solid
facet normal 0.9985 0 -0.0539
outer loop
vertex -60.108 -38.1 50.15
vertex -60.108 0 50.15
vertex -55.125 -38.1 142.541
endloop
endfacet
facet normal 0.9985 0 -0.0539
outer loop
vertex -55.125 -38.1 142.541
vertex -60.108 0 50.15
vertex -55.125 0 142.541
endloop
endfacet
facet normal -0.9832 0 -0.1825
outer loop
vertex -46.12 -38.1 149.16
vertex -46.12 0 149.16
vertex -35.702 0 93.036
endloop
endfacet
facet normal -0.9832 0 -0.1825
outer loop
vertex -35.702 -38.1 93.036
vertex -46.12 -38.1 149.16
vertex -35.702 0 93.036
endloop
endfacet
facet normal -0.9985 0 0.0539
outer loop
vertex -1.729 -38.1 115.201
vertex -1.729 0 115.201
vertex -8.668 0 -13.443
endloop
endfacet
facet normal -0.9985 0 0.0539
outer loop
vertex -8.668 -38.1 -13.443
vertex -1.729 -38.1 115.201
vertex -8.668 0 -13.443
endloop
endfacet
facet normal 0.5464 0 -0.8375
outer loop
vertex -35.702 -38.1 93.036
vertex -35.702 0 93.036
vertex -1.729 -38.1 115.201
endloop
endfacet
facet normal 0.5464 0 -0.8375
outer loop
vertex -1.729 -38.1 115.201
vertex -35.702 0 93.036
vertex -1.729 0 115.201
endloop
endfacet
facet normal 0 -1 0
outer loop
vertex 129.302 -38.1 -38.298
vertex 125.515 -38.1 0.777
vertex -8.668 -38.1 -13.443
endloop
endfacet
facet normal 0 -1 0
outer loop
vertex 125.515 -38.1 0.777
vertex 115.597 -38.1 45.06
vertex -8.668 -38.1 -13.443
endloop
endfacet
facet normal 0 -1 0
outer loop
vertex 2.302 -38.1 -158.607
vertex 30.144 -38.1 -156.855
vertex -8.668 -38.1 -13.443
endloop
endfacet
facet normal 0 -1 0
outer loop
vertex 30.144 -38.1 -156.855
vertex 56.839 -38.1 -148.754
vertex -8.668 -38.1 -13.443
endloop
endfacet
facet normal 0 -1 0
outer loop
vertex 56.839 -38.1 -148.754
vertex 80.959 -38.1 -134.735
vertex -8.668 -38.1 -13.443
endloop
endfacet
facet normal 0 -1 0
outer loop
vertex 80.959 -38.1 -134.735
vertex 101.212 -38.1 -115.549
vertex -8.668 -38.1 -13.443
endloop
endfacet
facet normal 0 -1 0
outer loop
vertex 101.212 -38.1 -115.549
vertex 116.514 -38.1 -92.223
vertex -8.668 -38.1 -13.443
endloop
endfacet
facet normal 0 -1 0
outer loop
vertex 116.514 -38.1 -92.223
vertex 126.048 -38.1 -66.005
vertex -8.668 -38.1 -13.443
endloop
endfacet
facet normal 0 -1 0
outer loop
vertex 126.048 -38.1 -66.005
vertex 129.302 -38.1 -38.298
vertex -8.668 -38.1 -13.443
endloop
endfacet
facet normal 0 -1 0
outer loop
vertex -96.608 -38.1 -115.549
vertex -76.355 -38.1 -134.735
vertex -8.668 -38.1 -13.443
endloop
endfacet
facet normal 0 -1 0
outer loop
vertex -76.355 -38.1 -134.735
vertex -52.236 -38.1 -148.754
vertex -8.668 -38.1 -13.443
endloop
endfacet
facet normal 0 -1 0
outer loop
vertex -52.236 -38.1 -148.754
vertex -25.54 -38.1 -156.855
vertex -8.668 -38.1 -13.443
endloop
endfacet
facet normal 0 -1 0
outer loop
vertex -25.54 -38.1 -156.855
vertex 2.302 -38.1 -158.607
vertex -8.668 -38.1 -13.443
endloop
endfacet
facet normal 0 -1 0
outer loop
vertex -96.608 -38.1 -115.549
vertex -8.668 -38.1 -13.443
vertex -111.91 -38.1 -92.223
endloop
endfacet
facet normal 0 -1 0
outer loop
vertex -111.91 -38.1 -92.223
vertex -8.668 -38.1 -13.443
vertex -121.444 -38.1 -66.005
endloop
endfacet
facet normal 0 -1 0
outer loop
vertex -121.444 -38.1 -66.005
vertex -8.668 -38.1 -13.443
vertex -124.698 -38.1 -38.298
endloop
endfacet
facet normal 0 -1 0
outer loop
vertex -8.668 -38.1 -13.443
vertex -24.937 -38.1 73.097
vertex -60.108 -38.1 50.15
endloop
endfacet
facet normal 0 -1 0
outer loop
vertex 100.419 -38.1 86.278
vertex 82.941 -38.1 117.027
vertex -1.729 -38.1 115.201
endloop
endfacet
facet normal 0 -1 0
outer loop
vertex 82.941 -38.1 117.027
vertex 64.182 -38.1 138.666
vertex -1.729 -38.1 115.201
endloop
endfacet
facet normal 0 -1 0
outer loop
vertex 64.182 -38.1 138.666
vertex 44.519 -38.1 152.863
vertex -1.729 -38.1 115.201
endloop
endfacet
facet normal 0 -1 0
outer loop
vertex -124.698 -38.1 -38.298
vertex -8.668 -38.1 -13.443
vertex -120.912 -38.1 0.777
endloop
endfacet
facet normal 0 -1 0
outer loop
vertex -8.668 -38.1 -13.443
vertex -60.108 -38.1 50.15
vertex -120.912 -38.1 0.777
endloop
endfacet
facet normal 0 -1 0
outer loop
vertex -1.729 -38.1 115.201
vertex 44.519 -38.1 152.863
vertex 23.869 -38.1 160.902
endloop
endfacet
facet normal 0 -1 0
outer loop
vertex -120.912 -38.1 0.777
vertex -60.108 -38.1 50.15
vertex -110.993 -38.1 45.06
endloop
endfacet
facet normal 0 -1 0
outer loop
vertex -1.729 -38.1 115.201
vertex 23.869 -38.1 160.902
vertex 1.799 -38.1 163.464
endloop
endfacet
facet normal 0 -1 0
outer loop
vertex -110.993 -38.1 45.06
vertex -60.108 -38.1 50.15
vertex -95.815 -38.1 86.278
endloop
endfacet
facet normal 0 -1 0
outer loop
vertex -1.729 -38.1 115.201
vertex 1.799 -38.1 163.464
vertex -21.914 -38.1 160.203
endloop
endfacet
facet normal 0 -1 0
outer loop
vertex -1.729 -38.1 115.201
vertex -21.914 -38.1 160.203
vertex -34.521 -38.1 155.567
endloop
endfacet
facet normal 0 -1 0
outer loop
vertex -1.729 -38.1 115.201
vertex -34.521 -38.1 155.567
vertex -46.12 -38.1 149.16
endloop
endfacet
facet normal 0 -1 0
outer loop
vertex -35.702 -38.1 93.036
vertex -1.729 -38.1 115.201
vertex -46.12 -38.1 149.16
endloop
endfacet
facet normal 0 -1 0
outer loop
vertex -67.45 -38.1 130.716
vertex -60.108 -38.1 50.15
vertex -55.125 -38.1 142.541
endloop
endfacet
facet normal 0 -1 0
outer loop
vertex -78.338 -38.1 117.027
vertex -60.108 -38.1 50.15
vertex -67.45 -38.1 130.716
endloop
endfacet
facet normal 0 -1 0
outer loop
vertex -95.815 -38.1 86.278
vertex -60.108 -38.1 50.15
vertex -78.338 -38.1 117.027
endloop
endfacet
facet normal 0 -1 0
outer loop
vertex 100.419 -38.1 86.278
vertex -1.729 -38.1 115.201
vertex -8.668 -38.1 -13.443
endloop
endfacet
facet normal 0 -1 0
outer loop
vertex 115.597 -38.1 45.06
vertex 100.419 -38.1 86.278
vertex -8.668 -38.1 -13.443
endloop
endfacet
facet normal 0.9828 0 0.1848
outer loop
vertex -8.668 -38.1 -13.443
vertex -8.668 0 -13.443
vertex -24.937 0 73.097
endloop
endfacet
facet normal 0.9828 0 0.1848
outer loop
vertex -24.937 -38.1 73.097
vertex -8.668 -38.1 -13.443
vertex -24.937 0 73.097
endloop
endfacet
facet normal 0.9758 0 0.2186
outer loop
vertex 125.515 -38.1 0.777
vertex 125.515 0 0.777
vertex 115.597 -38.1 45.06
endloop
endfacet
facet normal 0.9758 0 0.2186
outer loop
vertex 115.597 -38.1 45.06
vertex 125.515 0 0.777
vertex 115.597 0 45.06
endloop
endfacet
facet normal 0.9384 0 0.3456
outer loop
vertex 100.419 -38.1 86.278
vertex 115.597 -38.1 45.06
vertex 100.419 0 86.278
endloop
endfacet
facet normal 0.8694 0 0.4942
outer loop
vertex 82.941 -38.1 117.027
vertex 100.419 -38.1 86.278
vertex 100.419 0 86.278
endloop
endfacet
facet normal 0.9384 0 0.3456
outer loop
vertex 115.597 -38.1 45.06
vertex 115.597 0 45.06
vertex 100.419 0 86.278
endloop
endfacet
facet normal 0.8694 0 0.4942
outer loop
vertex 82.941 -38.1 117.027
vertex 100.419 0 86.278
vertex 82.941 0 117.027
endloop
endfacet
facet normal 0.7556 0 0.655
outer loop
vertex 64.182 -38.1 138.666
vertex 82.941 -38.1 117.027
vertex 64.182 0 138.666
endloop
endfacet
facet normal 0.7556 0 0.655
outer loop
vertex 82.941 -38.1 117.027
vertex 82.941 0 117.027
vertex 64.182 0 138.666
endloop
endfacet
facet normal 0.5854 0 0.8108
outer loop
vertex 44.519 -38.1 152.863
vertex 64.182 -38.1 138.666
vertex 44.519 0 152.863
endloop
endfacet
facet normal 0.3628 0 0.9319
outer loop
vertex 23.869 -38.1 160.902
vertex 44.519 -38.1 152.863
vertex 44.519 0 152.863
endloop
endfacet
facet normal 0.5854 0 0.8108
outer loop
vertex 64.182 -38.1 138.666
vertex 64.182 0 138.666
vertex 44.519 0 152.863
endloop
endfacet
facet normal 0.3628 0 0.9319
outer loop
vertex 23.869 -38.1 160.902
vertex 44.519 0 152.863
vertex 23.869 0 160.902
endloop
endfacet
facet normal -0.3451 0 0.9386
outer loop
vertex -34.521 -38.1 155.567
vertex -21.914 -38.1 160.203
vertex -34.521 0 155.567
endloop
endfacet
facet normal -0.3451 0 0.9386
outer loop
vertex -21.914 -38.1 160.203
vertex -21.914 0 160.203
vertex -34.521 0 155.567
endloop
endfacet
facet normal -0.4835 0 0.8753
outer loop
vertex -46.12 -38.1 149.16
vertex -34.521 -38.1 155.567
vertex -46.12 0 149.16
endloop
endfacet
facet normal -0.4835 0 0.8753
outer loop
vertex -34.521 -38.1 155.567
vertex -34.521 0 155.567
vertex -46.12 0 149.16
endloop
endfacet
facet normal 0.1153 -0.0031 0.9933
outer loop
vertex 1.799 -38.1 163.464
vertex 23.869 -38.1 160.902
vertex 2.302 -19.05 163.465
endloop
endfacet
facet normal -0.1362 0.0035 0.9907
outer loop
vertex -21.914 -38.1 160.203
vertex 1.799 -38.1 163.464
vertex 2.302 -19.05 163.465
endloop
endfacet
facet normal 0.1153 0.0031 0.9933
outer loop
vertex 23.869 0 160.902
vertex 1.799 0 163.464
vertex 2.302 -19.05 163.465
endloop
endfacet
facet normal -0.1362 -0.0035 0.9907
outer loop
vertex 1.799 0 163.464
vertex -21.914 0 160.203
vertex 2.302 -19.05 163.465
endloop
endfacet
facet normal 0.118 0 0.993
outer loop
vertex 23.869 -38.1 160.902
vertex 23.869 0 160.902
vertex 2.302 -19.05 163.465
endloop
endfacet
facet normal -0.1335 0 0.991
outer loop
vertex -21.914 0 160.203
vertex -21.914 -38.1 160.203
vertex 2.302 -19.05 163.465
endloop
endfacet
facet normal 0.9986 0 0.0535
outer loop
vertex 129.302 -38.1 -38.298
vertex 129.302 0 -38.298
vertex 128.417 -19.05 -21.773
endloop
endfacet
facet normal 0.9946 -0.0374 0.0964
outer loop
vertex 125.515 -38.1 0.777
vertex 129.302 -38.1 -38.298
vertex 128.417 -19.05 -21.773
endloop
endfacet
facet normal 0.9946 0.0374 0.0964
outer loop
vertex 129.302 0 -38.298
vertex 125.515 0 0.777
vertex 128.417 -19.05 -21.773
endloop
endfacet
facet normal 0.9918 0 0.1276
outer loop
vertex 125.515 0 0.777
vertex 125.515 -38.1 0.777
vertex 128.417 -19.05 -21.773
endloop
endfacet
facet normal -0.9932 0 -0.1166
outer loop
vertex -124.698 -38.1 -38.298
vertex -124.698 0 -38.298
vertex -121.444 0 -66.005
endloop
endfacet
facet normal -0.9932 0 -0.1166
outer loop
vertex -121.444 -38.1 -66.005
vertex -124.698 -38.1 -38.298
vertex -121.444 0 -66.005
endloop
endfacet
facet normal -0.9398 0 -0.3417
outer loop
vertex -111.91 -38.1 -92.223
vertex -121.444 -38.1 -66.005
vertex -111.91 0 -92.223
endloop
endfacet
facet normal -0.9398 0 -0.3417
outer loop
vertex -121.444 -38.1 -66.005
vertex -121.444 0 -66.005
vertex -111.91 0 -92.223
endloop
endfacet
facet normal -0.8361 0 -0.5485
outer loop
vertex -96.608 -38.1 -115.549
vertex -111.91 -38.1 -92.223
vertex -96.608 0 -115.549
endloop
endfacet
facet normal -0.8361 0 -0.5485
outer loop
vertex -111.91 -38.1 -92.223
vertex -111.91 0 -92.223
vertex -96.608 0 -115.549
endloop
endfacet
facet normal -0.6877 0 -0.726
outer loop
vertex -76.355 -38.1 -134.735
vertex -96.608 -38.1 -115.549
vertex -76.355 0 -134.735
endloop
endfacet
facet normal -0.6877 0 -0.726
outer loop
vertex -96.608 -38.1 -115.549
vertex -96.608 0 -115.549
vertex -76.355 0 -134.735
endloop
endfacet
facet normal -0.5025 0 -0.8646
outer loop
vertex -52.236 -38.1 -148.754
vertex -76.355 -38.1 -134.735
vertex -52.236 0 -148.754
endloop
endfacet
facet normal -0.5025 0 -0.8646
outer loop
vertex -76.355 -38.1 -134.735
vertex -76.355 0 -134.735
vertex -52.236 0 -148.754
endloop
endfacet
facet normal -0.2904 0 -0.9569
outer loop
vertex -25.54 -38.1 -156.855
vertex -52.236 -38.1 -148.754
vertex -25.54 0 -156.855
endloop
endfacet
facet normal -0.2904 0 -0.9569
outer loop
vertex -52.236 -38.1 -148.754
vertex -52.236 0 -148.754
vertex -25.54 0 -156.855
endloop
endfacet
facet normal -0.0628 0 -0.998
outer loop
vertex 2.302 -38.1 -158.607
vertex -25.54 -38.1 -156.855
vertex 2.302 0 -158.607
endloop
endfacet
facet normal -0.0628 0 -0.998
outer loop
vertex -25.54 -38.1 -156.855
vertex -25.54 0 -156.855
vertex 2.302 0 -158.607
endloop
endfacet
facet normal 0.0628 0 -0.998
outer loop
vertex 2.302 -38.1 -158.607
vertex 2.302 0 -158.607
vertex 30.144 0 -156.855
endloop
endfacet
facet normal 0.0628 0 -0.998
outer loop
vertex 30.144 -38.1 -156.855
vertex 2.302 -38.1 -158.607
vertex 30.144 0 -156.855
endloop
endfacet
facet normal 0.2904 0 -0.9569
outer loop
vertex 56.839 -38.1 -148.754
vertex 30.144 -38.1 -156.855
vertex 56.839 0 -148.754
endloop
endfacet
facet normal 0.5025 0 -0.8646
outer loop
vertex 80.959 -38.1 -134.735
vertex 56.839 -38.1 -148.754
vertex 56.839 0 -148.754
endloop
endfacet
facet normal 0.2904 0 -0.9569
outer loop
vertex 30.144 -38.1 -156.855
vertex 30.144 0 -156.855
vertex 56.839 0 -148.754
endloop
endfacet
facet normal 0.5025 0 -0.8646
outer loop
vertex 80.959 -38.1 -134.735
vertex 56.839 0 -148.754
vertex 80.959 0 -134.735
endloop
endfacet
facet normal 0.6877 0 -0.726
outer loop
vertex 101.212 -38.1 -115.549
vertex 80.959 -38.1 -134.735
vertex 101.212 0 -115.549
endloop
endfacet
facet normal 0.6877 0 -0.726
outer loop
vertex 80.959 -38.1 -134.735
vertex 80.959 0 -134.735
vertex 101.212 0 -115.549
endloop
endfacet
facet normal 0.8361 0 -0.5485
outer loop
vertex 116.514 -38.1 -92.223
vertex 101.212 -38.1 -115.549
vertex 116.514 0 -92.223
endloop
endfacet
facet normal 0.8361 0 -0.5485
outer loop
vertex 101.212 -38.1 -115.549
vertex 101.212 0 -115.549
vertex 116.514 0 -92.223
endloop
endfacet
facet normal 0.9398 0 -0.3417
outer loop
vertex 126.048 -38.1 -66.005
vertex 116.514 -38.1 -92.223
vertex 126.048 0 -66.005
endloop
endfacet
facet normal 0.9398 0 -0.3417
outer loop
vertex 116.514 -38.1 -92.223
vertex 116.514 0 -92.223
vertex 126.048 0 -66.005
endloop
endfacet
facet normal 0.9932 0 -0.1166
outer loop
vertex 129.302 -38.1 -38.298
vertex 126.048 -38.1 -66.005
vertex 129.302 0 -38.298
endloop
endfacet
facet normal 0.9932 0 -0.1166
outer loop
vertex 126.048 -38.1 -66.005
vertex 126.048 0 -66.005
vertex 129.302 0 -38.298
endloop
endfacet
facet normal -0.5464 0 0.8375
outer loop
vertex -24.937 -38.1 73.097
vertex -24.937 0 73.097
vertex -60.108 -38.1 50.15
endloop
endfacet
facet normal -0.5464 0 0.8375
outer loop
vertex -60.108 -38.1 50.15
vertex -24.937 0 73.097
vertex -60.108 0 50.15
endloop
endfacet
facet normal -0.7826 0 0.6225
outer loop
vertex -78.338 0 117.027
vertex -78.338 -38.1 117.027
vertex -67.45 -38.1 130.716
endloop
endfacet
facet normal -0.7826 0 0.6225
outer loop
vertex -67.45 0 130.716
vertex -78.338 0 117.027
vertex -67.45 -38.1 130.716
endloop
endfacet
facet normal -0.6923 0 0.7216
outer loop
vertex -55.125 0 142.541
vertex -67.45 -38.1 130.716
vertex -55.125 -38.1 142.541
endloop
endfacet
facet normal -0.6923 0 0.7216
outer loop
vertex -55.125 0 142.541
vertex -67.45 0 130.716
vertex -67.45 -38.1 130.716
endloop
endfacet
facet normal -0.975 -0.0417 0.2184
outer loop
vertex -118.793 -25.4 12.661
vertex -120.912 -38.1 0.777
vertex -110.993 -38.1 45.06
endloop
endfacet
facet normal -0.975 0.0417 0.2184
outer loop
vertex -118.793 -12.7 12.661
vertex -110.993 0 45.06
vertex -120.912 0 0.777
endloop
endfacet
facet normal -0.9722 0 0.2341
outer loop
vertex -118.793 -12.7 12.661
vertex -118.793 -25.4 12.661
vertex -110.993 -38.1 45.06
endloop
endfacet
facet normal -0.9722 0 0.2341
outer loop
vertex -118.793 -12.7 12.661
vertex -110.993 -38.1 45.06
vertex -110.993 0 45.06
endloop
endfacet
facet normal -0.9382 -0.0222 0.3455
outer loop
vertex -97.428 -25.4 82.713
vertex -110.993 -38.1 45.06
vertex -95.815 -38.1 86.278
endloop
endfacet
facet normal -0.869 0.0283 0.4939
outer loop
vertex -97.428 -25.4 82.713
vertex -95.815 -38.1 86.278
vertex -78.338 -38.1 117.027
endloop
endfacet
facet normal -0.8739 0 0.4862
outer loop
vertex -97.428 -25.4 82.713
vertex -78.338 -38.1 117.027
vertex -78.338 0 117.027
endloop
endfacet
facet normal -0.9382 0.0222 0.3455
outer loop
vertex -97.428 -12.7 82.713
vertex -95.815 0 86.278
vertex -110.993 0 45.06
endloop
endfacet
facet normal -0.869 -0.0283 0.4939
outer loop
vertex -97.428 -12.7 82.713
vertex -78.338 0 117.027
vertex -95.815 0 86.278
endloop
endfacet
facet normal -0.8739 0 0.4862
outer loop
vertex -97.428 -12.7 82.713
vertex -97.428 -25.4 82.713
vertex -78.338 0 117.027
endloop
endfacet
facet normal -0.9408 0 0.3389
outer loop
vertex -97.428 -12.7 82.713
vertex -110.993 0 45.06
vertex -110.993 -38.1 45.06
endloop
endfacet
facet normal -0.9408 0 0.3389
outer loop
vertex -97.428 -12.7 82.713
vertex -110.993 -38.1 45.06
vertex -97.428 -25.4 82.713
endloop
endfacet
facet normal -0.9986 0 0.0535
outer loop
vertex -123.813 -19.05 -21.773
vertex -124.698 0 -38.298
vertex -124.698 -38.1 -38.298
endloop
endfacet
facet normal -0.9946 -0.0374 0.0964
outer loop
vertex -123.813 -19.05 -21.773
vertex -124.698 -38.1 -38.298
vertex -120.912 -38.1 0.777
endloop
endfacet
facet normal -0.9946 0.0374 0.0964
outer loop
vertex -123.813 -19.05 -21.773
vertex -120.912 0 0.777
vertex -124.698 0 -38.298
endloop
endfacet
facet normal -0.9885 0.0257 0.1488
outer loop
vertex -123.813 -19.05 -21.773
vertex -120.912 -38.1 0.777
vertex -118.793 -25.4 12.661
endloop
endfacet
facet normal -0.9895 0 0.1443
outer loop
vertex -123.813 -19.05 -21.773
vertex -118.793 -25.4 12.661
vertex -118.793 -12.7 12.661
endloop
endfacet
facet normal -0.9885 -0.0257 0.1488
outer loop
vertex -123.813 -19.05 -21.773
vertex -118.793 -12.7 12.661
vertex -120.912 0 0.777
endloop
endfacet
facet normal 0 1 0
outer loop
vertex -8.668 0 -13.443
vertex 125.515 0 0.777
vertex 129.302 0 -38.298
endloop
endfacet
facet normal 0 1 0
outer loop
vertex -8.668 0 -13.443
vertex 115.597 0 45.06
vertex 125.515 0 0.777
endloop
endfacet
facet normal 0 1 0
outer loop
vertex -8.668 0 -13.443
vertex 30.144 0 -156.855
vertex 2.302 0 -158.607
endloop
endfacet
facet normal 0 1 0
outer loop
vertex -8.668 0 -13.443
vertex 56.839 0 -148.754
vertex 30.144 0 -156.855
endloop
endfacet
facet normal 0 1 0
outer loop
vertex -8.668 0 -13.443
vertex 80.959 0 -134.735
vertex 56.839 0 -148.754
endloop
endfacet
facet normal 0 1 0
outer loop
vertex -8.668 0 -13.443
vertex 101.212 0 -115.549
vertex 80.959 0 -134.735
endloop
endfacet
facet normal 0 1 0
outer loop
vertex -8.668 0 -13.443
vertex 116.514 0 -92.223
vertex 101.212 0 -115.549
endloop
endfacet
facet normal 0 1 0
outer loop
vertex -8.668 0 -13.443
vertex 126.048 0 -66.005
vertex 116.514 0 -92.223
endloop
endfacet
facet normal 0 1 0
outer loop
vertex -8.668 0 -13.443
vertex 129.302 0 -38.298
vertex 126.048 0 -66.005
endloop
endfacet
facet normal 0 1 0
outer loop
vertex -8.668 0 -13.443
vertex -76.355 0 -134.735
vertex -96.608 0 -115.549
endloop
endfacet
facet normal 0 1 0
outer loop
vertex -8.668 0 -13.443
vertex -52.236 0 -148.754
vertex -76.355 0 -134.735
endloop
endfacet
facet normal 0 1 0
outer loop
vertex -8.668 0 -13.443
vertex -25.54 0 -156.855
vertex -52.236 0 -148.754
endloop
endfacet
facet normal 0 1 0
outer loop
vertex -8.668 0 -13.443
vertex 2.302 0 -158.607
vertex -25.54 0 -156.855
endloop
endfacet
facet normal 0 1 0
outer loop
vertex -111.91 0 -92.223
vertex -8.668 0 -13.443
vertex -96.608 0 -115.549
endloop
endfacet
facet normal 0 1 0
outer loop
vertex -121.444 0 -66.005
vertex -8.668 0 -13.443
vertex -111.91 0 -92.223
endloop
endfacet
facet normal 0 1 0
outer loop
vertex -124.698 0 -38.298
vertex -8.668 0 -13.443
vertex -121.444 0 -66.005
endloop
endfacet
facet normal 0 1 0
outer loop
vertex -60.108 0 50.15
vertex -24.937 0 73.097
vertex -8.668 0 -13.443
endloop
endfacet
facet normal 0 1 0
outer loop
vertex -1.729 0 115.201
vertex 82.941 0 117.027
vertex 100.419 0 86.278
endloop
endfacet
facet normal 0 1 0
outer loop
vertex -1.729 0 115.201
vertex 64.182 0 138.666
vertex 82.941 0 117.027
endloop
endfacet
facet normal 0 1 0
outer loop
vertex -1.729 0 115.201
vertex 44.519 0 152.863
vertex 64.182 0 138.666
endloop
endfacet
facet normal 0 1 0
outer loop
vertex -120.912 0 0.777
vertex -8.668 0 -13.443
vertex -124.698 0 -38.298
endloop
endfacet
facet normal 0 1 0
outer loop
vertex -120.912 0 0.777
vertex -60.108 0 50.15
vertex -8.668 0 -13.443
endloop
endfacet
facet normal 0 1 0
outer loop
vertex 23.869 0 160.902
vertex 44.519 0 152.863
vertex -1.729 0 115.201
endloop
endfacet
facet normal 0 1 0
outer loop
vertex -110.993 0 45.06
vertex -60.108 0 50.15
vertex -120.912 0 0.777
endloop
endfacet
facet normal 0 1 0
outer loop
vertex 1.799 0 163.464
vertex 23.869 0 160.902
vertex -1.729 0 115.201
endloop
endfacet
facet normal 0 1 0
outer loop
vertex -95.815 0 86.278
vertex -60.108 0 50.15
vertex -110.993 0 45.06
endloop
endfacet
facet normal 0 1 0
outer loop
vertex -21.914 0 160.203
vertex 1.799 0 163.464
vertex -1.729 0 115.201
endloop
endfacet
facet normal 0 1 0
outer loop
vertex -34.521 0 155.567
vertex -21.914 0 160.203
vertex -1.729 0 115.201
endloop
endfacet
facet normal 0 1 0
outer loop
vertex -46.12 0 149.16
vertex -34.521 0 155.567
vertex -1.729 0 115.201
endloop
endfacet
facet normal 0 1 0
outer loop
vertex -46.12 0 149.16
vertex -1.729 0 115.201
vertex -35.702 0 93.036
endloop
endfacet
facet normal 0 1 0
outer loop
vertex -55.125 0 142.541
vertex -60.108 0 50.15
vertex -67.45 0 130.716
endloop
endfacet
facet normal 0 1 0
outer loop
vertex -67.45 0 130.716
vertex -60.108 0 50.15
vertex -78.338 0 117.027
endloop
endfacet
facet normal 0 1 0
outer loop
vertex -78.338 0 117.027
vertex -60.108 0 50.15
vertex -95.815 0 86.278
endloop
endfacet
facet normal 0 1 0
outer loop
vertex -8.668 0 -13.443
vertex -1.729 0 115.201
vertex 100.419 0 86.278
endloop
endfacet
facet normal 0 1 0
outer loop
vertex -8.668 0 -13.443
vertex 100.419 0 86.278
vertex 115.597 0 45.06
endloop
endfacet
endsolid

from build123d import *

# Parameters (mm, degrees)
F1_DEPTH = 38.1


with BuildPart() as f1:
    # F0 (on Front) → F1 (new body)
    with BuildSketch(Plane.XZ):
        with BuildLine():
            add(Edge.make_bspline(
                [(-124.698026, -38.298128), (-124.698026, -6.657428), (-109.722411, 97.596107), (-55.124661, 142.541462)],
                knots=[0, 0, 0, 0, 185.214936, 185.214936, 185.214936, 185.214936], degree=3))
            ThreePointArc((-124.698026, -38.298128), (-87.037867, -125.729423), (2.301974, -158.606644))
            ThreePointArc((2.301974, -158.606644), (91.641816, -125.729423), (129.301974, -38.298128))
            add(Edge.make_bspline(
                [(129.301974, -38.298128), (129.301974, 2.429356), (104.489639, 163.465356), (2.301974, 163.465356)],
                knots=[0, 0, 0, 0, 238.406173, 238.406173, 238.406173, 238.406173], degree=3))
            add(Edge.make_bspline(
                [(-46.119579, 149.159544), (-32.330696, 158.131419), (-16.295798, 163.465356), (2.301974, 163.465356)],
                knots=[195.017142, 195.017142, 195.017142, 195.017142, 238.406173, 238.406173, 238.406173, 238.406173], degree=3))
            Line((-46.119579, 149.159544), (-35.702314, 93.036128))
            Line((-35.702314, 93.036128), (-1.729349, 115.201356))
            Line((-1.729349, 115.201356), (-8.66785, -13.442805))
            Line((-8.66785, -13.442805), (-24.936882, 73.096852))
            Line((-24.936882, 73.096852), (-60.107851, 50.150001))
            Line((-60.107851, 50.150001), (-55.124661, 142.541462))
        make_face()
    extrude(amount=F1_DEPTH)


solid = f1.part
